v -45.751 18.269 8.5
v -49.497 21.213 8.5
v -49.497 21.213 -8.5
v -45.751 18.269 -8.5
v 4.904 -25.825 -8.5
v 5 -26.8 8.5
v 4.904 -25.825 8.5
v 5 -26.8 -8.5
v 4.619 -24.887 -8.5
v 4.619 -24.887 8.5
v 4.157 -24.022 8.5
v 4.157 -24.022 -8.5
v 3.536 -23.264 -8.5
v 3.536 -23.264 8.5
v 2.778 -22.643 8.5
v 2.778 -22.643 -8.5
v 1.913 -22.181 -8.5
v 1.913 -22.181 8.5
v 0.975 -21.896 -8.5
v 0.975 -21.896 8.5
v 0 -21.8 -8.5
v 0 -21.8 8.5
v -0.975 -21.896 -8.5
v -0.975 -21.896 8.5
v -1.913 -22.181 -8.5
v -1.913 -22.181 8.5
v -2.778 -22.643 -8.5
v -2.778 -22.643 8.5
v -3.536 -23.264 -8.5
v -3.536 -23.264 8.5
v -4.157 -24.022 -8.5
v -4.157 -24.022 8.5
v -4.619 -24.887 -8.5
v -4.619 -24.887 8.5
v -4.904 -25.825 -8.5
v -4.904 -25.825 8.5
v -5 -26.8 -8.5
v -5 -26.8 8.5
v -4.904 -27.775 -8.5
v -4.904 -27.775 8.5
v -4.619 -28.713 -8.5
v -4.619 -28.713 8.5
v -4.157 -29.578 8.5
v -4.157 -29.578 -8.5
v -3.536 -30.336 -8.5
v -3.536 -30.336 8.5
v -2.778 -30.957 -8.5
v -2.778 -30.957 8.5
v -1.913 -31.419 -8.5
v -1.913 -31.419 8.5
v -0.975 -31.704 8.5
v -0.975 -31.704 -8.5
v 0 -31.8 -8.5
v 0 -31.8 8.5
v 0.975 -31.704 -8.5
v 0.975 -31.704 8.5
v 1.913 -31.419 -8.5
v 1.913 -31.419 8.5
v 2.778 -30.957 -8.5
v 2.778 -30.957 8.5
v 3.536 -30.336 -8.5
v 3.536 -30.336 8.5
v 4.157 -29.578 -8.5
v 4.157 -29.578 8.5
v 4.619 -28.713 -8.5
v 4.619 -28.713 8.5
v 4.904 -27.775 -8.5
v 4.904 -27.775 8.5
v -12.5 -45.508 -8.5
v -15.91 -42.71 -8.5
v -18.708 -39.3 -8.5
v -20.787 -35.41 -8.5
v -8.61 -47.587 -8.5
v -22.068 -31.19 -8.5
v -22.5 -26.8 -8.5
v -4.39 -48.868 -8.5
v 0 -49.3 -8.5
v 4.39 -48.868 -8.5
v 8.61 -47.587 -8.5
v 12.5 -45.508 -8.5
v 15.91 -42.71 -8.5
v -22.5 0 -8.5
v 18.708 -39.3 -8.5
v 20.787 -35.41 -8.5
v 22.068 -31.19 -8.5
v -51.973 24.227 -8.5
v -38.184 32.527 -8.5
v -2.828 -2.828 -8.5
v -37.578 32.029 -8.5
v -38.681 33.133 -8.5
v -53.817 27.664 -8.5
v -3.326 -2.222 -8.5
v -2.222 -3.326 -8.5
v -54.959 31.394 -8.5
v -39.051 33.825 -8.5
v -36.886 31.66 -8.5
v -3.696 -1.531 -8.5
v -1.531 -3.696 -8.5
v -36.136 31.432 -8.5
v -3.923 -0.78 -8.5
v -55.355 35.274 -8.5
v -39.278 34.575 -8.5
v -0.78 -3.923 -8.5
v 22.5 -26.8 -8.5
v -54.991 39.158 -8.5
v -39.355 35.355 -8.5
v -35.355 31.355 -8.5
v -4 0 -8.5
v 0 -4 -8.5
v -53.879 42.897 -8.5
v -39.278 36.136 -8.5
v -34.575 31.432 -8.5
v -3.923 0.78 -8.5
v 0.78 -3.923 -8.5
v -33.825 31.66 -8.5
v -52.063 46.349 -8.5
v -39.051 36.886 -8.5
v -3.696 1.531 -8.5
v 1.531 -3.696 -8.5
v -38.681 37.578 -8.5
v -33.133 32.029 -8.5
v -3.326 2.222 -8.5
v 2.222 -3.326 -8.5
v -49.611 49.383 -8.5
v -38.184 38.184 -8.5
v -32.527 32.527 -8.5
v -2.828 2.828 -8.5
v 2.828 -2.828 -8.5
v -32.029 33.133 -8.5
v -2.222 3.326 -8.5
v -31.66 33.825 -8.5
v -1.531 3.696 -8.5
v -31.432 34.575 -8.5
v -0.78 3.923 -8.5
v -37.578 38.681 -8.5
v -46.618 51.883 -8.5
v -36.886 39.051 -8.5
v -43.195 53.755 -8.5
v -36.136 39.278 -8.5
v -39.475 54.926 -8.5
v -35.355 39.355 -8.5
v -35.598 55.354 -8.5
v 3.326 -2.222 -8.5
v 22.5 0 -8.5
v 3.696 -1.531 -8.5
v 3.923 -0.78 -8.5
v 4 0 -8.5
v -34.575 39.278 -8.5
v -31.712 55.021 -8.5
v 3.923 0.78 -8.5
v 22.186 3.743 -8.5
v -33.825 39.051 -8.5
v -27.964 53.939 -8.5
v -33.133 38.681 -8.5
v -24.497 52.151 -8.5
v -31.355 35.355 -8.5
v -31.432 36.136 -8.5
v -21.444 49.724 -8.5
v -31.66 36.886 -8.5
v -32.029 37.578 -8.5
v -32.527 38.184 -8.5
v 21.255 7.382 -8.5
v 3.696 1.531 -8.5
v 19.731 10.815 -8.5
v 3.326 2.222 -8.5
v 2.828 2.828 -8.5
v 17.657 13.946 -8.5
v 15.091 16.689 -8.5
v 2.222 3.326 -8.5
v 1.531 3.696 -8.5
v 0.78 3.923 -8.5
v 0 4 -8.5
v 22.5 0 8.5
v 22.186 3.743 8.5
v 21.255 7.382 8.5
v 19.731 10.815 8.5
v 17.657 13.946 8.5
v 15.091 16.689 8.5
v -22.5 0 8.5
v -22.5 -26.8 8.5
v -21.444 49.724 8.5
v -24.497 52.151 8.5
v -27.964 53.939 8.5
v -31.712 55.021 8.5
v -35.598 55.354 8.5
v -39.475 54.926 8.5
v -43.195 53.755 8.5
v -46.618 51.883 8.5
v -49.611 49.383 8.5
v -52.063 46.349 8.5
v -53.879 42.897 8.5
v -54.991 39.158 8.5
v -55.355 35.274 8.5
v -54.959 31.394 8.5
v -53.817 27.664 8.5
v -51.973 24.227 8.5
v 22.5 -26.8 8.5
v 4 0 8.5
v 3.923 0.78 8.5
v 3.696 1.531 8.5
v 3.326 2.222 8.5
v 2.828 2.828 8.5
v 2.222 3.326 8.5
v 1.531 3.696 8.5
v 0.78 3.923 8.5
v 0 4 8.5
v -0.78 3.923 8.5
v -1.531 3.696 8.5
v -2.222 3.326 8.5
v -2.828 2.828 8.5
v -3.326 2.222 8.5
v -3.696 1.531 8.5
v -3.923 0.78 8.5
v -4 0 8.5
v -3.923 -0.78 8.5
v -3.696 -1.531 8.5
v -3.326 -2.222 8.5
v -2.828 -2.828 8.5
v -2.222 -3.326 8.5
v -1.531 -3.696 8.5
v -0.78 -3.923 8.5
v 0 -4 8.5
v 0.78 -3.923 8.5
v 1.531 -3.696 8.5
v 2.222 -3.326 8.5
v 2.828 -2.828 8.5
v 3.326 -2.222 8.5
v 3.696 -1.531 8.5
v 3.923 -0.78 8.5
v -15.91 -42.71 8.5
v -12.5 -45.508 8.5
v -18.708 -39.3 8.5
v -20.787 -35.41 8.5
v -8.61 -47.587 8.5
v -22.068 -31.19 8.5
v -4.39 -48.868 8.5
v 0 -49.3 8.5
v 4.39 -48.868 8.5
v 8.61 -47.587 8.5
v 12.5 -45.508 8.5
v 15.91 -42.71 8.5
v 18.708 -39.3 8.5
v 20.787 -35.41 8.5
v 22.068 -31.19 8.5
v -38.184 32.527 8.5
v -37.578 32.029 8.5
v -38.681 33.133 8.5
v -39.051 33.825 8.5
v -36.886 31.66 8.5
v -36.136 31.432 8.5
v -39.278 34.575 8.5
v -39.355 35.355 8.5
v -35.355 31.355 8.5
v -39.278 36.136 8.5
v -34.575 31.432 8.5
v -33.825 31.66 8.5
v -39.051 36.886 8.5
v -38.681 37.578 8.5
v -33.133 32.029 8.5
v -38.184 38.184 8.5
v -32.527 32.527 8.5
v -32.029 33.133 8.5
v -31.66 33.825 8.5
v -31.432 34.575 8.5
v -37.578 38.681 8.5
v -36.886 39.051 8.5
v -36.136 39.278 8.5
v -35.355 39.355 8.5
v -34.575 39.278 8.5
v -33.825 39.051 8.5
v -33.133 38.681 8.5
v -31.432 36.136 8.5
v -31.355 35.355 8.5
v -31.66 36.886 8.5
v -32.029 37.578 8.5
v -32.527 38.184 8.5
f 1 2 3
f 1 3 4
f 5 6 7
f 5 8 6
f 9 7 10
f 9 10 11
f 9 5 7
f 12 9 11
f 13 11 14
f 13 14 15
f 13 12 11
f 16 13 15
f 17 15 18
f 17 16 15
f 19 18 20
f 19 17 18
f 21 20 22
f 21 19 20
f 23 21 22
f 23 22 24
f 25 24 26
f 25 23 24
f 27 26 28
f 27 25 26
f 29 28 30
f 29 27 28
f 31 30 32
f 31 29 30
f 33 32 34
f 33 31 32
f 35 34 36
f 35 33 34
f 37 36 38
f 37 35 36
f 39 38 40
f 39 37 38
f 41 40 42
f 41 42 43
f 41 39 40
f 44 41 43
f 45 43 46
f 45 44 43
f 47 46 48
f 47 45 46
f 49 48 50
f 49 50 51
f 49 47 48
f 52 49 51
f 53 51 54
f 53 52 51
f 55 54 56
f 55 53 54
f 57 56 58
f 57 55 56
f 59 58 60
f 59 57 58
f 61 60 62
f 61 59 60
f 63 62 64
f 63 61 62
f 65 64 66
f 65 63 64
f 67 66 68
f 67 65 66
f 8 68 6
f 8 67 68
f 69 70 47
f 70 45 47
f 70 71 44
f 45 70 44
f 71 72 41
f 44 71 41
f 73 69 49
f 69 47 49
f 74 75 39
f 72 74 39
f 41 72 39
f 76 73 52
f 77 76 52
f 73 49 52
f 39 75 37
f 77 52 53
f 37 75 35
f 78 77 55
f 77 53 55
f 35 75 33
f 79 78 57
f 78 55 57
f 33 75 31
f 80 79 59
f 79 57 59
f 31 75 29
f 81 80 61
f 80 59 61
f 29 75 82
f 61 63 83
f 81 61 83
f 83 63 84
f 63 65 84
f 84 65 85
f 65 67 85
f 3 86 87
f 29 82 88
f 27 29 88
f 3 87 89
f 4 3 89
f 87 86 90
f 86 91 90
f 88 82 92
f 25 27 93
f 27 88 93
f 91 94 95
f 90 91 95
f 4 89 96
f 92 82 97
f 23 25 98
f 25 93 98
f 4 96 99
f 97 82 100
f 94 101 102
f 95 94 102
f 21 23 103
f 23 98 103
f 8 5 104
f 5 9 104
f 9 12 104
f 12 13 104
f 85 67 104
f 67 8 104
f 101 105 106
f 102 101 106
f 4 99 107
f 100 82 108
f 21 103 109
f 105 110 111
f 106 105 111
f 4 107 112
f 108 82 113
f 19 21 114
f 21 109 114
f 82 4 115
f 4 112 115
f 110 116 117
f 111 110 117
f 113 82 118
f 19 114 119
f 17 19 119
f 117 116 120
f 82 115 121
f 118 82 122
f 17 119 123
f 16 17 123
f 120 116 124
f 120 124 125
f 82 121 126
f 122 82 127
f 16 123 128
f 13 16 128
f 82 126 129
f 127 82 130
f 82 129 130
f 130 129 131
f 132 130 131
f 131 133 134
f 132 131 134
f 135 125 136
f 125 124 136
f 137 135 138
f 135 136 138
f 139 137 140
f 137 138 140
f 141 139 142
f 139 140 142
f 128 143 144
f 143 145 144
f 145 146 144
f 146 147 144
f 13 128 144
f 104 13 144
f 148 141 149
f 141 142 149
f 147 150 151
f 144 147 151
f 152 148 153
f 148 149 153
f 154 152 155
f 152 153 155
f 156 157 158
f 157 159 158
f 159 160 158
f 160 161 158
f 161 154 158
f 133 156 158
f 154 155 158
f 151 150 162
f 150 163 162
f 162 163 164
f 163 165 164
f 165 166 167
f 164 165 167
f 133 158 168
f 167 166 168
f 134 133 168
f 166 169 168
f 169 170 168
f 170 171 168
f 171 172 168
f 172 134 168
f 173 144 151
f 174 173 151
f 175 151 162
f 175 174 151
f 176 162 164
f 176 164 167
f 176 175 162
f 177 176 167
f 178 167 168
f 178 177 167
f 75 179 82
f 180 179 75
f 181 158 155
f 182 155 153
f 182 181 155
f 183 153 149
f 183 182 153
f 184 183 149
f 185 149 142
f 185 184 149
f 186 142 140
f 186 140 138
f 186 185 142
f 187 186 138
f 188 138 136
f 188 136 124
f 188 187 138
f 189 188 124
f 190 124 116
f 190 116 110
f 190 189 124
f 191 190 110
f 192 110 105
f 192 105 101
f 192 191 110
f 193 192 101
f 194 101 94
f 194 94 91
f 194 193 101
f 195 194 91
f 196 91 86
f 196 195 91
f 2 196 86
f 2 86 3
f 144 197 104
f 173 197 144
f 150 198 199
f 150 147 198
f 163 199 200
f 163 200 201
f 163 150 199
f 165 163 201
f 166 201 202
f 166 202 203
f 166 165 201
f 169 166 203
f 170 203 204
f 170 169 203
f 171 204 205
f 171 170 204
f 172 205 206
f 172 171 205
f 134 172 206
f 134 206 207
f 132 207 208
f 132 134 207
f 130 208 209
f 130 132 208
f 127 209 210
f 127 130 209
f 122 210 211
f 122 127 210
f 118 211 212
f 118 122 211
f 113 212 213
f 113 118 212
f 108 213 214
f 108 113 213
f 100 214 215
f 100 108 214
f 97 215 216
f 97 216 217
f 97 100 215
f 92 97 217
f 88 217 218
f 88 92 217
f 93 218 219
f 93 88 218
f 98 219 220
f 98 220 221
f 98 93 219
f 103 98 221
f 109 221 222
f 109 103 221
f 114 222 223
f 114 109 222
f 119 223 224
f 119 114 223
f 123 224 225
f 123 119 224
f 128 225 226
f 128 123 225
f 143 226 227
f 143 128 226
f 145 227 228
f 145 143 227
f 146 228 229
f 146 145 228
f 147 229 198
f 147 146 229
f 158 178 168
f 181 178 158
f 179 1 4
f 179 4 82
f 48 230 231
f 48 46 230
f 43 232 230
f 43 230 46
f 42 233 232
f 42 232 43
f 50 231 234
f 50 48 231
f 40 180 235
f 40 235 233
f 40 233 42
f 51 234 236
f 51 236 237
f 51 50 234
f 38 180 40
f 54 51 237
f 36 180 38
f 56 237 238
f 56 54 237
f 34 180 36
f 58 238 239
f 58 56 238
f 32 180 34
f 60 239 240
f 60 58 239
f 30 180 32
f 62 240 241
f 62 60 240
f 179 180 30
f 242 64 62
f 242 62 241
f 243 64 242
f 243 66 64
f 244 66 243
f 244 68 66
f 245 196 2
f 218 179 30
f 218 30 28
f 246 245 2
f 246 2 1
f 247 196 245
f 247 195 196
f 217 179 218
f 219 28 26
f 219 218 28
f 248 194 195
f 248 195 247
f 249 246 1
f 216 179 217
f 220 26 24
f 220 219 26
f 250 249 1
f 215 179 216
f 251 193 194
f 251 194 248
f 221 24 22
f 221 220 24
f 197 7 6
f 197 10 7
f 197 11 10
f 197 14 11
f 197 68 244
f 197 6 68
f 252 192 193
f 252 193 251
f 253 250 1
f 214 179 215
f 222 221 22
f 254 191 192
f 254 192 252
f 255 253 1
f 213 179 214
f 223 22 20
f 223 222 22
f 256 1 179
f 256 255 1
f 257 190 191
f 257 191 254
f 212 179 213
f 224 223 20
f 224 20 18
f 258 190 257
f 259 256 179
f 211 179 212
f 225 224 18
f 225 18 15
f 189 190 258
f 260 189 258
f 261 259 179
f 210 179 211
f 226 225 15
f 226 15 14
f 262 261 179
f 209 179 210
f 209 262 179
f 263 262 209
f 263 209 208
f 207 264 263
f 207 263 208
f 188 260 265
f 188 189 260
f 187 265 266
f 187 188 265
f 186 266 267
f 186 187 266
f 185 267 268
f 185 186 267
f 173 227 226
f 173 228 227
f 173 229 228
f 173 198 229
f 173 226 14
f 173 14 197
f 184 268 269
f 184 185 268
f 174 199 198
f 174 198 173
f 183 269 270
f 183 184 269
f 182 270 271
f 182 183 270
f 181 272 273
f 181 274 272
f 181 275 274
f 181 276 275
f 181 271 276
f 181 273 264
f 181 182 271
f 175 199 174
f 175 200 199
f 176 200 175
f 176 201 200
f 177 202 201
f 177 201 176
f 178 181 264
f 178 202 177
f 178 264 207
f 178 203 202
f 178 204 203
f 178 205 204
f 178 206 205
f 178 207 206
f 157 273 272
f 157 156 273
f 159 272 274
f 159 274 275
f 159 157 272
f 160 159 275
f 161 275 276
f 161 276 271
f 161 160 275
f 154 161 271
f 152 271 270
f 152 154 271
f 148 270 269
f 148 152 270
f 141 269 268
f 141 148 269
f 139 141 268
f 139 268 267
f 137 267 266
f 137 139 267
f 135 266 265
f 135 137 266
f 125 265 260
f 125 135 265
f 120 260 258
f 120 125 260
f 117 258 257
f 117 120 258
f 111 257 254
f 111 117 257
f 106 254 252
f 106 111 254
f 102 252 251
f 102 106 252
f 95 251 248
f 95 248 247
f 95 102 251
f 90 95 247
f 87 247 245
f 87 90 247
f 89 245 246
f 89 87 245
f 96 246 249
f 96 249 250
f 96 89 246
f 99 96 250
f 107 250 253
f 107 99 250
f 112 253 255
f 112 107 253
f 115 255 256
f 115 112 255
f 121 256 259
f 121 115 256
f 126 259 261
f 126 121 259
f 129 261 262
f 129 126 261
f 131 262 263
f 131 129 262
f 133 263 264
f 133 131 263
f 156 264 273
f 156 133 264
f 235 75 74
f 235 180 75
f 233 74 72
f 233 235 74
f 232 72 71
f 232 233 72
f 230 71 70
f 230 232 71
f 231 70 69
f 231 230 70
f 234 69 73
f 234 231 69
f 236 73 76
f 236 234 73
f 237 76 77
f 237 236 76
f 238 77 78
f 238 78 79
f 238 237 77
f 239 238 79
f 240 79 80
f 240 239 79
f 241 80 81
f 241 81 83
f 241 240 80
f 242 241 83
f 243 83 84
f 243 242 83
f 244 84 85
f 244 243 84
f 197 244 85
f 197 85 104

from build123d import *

# Parameters (mm, degrees)
F0_R     = 5
F0_R_2   = 4
F1_DEPTH = 8.5


with BuildPart() as f1:
    # F0 (on Top) → F1 (new body, symmetric)
    with BuildSketch(Plane.XY):
        with BuildLine():
            Line((15.090626, 16.689009), (-21.443711, 49.724285))
            ThreePointArc((-21.443711, 49.724285), (-49.611346, 49.382679), (-49.497475, 21.213203))
            Line((-49.497475, 21.213203), (-45.750738, 18.269213))
            Line((-45.750738, 18.269213), (-22.5, 0))
            Line((-22.5, 0), (-22.5, -26.8))
            ThreePointArc((-22.5, -26.8), (0, -49.3), (22.5, -26.8))
            Line((22.5, -26.8), (22.5, 0))
            ThreePointArc((22.5, 0), (20.5644, 9.129921), (15.090626, 16.689009))
        make_face()
        with Locations((0, -26.8)):
            Circle(F0_R, mode=Mode.SUBTRACT)
        Circle(F0_R_2, mode=Mode.SUBTRACT)
        with Locations((-35.355339, 35.355339)):
            Circle(F0_R_2, mode=Mode.SUBTRACT)
    extrude(amount=F1_DEPTH, both=True)


solid = f1.part
